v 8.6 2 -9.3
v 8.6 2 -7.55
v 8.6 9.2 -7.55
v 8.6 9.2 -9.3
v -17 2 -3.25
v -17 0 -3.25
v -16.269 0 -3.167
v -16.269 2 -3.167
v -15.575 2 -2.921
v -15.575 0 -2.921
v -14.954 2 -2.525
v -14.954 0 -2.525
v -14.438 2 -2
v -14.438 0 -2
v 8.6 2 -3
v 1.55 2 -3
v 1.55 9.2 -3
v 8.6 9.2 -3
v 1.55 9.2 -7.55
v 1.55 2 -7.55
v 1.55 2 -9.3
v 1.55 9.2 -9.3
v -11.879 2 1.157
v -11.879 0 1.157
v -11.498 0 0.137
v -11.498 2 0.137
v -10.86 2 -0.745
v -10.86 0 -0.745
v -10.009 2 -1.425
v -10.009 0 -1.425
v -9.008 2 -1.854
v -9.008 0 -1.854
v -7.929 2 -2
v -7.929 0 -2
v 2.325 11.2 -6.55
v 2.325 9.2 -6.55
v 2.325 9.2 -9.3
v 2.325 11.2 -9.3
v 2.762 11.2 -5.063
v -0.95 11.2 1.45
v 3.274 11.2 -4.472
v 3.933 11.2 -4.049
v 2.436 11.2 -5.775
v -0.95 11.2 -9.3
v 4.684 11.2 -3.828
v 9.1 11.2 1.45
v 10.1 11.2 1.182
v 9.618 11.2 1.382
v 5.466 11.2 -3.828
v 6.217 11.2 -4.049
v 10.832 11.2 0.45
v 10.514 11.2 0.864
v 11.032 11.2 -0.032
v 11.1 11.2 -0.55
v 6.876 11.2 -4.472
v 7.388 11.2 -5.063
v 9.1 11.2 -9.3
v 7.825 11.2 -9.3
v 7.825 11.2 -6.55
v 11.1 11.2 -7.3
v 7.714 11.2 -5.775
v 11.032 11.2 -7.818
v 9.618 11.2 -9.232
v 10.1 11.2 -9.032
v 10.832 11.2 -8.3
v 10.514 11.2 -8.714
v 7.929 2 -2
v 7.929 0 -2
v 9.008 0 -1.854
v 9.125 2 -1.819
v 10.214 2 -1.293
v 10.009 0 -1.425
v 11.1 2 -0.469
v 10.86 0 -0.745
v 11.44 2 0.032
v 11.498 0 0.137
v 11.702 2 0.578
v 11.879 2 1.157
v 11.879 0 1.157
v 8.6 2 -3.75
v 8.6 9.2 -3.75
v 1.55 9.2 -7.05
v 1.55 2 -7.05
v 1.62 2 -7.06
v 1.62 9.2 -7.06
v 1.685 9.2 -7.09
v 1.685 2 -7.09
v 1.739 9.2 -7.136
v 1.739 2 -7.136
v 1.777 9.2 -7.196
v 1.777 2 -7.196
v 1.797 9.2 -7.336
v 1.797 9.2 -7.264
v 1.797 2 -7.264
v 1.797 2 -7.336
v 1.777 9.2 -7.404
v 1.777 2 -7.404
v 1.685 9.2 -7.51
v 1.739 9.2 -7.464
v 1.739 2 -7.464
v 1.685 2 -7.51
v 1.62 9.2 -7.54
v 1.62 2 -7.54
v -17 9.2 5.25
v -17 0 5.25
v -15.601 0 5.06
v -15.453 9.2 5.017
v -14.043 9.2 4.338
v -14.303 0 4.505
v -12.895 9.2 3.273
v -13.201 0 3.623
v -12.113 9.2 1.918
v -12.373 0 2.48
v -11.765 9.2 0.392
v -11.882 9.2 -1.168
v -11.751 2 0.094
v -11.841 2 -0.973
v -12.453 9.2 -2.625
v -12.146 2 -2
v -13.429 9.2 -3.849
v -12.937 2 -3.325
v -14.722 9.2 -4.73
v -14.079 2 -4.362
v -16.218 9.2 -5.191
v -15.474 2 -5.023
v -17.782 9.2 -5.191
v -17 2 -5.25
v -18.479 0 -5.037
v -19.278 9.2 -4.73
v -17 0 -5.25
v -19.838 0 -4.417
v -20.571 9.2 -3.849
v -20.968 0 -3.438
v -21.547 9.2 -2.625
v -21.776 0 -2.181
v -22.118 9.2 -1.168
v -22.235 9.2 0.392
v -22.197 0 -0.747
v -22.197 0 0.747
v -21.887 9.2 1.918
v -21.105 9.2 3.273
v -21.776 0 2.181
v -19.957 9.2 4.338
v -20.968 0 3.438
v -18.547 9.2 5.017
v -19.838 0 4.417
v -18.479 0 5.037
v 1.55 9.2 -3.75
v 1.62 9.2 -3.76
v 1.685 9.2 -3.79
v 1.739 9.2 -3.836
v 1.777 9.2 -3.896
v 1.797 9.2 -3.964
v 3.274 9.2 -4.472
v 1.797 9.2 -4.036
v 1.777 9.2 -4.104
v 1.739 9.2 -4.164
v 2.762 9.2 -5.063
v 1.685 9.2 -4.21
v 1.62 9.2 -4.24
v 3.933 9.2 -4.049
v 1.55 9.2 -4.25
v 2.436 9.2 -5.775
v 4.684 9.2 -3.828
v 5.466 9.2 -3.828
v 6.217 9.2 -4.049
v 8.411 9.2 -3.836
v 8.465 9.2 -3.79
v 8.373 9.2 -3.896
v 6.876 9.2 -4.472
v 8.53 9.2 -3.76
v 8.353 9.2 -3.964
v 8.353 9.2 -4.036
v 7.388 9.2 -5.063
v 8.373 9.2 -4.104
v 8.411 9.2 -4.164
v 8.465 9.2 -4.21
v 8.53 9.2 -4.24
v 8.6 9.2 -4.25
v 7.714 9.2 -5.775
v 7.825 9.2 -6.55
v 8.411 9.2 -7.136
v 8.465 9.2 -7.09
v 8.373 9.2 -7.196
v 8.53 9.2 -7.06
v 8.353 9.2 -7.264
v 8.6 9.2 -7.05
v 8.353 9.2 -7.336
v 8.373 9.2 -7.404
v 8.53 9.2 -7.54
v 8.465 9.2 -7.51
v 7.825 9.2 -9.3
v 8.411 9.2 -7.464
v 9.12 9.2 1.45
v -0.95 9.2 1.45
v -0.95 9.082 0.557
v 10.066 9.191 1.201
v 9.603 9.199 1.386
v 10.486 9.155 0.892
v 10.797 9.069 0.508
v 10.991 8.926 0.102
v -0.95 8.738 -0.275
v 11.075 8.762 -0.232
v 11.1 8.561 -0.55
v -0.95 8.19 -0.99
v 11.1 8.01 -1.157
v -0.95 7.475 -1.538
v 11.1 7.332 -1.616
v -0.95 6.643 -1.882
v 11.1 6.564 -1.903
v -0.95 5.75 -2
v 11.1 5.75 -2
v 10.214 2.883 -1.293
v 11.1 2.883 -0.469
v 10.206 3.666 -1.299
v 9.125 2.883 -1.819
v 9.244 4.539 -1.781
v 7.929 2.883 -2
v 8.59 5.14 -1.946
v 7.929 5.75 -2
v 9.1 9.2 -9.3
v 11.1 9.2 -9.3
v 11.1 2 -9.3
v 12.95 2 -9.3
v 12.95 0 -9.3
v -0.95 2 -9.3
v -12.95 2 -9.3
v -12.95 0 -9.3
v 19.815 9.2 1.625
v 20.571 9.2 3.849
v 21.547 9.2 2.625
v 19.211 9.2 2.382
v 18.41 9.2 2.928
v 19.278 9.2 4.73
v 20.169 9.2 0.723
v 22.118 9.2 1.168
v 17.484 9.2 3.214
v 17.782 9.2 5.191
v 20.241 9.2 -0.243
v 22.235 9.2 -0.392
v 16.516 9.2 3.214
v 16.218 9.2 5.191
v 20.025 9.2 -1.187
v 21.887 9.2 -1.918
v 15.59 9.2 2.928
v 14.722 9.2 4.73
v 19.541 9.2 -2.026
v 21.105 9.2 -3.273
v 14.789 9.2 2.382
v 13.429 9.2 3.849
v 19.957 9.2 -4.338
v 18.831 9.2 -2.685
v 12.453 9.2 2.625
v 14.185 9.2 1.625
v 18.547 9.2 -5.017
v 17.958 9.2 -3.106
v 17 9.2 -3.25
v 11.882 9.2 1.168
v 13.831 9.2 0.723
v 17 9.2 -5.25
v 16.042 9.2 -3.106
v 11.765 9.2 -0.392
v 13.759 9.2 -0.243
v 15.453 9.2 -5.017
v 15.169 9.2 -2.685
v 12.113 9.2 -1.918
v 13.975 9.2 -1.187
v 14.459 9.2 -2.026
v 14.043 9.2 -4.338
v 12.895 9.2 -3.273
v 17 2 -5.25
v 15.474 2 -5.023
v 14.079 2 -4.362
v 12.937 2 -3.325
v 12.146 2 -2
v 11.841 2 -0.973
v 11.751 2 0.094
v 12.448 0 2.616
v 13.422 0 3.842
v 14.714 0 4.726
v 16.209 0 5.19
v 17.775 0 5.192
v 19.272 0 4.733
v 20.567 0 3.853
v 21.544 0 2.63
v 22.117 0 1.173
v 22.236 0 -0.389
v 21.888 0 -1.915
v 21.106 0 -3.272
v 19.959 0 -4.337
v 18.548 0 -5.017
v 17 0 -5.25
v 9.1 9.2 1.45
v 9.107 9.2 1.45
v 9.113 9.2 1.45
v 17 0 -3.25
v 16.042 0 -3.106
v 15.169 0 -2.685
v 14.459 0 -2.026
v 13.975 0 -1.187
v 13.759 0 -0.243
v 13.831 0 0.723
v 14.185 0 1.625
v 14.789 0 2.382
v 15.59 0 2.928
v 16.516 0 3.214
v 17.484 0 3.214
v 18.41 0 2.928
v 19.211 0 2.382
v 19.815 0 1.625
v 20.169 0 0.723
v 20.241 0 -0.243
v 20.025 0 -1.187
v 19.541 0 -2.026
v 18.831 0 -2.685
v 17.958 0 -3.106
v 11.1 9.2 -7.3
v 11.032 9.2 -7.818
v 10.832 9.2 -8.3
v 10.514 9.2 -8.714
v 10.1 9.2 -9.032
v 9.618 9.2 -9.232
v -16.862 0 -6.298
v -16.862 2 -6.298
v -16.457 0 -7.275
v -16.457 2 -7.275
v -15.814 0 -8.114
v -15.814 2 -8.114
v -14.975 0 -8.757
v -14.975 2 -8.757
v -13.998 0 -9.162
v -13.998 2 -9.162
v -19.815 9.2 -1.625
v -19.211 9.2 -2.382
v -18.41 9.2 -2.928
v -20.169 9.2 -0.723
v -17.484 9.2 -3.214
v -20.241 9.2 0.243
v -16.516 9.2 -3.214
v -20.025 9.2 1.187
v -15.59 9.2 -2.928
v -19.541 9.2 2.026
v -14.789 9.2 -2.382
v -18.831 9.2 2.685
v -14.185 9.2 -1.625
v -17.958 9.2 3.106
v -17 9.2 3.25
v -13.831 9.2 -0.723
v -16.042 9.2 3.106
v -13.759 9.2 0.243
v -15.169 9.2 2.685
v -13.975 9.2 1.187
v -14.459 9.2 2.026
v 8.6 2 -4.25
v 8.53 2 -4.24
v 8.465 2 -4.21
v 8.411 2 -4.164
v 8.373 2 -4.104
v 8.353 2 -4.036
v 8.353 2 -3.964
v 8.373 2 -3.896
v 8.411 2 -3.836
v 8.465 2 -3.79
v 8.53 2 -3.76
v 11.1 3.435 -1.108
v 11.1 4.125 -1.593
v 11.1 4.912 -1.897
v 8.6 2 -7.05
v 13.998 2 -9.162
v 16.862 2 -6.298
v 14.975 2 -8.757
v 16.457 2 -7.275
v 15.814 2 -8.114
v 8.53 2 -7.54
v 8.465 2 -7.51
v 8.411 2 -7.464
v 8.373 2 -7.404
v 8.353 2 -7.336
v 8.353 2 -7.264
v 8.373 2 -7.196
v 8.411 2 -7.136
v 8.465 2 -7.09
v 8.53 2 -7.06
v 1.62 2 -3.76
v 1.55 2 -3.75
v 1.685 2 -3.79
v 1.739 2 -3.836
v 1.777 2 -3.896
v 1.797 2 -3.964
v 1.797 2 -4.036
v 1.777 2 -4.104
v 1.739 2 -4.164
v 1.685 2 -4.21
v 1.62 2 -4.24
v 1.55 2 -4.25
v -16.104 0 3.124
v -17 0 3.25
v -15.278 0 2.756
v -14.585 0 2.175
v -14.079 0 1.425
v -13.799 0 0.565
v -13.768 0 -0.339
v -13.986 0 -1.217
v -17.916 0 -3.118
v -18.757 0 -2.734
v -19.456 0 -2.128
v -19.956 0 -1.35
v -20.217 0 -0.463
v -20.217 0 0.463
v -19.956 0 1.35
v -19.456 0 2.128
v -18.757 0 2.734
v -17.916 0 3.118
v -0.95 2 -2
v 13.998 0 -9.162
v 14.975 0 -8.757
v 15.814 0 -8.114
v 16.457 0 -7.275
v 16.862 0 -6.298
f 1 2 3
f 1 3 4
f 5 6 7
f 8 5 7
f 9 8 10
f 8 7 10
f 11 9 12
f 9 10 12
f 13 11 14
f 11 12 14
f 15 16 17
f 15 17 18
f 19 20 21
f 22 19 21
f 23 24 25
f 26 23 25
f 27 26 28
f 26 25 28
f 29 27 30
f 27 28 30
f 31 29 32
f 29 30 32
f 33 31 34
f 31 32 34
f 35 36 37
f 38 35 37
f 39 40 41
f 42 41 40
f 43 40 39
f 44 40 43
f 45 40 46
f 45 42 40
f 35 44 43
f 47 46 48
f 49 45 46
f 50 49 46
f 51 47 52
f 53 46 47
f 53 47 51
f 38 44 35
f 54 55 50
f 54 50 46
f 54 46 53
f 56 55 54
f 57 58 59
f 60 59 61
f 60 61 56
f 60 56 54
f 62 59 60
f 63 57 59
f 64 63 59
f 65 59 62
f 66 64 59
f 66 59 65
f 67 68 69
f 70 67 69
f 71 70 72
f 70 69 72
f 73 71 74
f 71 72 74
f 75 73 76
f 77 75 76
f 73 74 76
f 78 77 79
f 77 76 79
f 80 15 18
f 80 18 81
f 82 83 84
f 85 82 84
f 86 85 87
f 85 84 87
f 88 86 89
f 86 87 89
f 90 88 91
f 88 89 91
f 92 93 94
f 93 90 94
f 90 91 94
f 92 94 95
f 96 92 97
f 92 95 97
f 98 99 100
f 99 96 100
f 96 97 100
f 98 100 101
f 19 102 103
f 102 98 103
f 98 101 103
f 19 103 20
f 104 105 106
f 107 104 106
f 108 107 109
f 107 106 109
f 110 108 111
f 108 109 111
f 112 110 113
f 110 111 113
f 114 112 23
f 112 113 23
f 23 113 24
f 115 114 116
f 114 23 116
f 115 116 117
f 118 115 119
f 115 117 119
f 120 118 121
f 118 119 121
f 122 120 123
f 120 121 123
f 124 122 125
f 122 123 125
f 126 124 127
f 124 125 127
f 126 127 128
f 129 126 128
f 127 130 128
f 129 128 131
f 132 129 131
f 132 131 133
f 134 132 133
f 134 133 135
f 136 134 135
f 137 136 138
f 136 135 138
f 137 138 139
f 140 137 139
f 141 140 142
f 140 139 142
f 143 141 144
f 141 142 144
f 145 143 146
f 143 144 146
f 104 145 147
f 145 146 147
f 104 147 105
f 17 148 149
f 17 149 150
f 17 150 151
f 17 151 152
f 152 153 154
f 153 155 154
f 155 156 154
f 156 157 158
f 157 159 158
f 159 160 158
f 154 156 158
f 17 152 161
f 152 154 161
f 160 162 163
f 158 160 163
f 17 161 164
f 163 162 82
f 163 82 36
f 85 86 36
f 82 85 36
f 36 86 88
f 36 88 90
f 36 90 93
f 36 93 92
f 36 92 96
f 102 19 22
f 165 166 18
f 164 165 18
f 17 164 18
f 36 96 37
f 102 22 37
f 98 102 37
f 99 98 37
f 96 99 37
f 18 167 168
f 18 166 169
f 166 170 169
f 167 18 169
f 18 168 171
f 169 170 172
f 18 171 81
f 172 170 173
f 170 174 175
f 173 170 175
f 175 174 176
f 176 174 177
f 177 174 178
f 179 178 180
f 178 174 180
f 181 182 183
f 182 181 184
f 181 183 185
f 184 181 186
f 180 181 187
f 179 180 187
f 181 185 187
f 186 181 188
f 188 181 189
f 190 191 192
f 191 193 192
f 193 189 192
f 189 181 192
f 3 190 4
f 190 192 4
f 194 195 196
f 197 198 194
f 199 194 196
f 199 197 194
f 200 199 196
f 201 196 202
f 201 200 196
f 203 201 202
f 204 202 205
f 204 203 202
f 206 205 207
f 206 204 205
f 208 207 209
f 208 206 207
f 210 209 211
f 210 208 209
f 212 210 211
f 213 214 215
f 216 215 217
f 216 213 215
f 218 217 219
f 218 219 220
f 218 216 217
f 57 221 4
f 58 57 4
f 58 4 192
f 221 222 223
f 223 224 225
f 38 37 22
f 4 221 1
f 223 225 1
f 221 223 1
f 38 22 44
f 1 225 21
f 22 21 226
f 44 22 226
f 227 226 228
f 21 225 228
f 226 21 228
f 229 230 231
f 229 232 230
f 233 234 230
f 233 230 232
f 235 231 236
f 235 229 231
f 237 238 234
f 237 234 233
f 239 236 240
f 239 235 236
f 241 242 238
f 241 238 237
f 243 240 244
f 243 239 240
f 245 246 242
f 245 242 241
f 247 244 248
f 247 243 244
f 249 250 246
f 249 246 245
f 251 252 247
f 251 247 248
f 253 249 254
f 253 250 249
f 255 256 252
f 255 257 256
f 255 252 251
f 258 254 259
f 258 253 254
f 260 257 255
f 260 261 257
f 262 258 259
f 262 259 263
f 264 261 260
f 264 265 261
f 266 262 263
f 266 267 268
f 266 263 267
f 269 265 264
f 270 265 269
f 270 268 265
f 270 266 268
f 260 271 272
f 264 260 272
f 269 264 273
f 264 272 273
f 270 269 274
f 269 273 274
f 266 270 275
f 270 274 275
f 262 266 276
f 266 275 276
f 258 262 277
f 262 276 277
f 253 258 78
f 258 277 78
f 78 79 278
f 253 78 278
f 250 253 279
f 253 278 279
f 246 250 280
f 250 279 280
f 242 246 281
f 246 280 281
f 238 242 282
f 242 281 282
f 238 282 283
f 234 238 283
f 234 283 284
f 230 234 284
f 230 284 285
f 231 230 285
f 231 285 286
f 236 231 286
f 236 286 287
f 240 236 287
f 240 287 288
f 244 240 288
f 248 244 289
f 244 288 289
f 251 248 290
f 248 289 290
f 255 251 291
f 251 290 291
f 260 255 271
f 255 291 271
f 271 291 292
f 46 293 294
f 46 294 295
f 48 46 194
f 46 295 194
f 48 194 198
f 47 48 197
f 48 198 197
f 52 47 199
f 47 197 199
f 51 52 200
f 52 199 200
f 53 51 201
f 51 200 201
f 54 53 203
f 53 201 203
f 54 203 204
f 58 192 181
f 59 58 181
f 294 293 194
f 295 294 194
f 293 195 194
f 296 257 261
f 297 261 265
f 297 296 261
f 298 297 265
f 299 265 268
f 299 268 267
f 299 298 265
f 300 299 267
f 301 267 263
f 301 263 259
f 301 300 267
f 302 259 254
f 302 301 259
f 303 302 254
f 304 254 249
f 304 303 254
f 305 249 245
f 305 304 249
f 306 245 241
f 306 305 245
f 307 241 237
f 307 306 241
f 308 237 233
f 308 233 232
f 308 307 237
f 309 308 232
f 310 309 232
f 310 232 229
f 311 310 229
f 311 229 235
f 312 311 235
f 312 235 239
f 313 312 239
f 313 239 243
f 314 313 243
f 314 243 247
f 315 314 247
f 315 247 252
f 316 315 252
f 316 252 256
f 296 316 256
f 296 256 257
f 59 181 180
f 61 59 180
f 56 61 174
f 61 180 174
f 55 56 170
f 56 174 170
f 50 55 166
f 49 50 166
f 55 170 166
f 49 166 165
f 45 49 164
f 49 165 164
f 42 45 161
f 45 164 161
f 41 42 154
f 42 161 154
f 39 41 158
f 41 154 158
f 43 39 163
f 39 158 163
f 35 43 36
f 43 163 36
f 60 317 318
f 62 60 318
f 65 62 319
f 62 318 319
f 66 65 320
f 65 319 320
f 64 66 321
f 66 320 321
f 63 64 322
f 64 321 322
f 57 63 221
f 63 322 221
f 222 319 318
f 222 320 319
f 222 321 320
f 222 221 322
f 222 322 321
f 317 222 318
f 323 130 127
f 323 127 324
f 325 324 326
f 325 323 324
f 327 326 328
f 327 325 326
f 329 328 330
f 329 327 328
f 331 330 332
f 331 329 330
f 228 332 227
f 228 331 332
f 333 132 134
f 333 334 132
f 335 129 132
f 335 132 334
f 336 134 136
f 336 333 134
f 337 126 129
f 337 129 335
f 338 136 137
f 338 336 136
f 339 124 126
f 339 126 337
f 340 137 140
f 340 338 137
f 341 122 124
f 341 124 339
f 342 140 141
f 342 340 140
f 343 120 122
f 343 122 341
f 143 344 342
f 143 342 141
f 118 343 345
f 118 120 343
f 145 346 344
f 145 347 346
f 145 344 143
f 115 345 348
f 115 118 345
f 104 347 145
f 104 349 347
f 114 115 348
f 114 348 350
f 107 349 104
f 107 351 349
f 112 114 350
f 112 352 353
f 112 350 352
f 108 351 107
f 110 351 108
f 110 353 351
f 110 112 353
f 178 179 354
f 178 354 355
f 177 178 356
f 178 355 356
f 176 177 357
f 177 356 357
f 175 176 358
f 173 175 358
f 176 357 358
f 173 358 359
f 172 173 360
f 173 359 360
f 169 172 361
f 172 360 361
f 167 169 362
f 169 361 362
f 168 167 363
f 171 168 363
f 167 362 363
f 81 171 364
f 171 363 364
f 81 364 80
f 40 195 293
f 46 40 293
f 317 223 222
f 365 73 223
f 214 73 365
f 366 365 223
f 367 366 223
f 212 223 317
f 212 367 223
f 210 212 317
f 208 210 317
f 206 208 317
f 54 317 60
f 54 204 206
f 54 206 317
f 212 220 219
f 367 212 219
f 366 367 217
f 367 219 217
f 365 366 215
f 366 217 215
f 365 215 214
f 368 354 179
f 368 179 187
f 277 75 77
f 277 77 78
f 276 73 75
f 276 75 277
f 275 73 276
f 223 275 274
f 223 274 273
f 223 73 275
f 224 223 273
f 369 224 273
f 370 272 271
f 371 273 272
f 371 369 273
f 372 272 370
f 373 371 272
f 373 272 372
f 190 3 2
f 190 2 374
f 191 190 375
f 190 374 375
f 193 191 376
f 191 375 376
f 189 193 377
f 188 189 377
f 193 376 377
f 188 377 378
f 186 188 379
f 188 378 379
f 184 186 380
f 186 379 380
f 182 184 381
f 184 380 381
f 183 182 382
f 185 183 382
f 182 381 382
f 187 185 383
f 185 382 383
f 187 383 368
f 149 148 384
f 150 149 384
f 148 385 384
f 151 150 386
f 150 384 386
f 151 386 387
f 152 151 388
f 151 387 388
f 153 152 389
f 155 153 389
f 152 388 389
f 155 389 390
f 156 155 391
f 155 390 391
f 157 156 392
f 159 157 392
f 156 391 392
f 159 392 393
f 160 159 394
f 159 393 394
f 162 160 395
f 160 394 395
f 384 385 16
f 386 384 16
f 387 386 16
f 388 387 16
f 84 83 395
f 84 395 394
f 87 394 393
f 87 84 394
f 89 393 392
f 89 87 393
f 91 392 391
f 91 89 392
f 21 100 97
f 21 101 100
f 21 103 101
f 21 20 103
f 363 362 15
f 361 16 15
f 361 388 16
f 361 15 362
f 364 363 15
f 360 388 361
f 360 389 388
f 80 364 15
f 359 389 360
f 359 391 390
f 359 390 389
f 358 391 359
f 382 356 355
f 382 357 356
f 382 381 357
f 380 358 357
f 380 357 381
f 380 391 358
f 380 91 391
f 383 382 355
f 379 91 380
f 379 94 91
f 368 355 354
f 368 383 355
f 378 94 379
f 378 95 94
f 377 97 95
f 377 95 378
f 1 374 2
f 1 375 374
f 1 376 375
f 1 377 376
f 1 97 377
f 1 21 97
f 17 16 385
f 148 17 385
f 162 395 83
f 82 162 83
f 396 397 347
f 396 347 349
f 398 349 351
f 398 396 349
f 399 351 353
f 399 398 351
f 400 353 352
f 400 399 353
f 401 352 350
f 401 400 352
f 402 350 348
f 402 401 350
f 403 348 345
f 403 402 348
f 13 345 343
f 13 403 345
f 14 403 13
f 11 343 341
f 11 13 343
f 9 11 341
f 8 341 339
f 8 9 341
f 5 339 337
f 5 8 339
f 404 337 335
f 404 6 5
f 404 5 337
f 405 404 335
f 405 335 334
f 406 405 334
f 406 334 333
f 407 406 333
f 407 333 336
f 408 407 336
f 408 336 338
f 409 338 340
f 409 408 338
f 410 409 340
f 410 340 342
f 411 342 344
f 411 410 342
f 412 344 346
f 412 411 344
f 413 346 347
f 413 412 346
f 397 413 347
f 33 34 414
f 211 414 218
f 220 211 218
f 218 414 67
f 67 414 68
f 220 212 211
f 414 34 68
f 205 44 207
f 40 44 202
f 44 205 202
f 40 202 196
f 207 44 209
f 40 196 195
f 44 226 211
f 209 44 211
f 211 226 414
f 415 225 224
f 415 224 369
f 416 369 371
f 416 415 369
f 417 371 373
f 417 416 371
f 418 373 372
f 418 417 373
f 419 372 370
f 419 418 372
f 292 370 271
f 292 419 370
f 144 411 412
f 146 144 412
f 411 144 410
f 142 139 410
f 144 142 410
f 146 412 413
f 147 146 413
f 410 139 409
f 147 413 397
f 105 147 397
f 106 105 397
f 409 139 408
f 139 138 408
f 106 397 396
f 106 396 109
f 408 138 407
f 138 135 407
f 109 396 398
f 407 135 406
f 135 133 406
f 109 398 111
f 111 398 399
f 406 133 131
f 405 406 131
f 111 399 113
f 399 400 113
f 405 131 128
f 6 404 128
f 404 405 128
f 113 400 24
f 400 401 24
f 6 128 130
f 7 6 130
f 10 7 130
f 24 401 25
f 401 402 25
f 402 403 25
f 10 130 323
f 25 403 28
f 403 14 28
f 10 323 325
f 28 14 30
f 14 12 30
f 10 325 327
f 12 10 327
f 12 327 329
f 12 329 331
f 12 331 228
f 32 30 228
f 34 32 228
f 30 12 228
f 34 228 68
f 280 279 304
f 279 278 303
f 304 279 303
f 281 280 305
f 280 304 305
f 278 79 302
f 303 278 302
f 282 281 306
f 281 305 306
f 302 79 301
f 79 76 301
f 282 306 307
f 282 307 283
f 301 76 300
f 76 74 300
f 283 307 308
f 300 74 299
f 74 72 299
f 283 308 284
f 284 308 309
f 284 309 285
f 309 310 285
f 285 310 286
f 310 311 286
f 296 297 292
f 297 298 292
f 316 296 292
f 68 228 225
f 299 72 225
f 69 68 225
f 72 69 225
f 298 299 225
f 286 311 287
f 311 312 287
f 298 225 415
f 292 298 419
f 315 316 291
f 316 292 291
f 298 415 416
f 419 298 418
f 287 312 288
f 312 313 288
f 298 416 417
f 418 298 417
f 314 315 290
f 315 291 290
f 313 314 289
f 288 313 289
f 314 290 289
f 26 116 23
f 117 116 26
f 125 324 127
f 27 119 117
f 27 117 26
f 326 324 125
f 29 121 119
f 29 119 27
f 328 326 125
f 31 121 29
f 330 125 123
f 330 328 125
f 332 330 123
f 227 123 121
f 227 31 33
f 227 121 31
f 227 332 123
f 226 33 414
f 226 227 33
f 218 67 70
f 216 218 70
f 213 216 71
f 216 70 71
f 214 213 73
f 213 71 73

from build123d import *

# Parameters (mm, degrees)
SKETCH1_R             = 5.25
SKETCH1_R_2           = 3.25
BOSS_EXTRUDE1_DEPTH   = 9.2
BOSS_EXTRUDE1_2_DEPTH = 9.2
BOSS_EXTRUDE2_DEPTH   = 2
SKETCH3_W             = 2.5
SKETCH3_H             = 7.3
BOSS_EXTRUDE3_DEPTH   = 7.2
BOSS_EXTRUDE4_DEPTH   = 2
SKETCH6_R             = 0.25
BOSS_EXTRUDE5_DEPTH   = 7.2
BOSS_EXTRUDE6_REACH   = 27.811
SKETCH7_W             = 7.05
SKETCH7_H             = 1
FILLET3_R             = 3.45
FILLET4_DEPTH         = 2
FILLET4_2_DEPTH       = 2
FILLET4_START         = 2
FILLET4_3_DEPTH       = 0.883001
FILLET4_START_2       = 7.928754
FILLET4_4_DEPTH       = 3.171246
FILLET4_START_3       = 2.883001
FILLET4_5_DEPTH       = 2.866999


with BuildPart() as part:
    # Sketch1 → Boss-Extrude1 (new body)
    with BuildSketch(Plane(origin=(0, 0, 0), x_dir=(1, 0, 0), z_dir=(0, 1, 0))):
        with Locations(Location((-17, 0, 0), (0, 0, 270))):
            Circle(SKETCH1_R)
        with Locations(Location((-17, 0, 0), (0, 0, 270))):
            Circle(SKETCH1_R_2, mode=Mode.SUBTRACT)
    extrude(amount=BOSS_EXTRUDE1_DEPTH)



with BuildPart() as body_2:
    # Sketch1 → Boss-Extrude1 2 (new body)
    with BuildSketch(Plane(origin=(0, 0, 0), x_dir=(1, 0, 0), z_dir=(0, 1, 0))):
        with Locations(Location((17, 0, 0), (0, 0, 90))):
            Circle(SKETCH1_R)
        with Locations(Location((17, 0, 0), (0, 0, 90))):
            Circle(SKETCH1_R_2, mode=Mode.SUBTRACT)
    extrude(amount=BOSS_EXTRUDE1_2_DEPTH)


with BuildPart() as part_1:
    add(part.part)

    add(body_2.part)  # Boss-Extrude2 merges body 2
    # Sketch2 → Boss-Extrude2 (add)
    with BuildSketch(Plane(origin=(0, 0, 0), x_dir=(1, 0, 0), z_dir=(0, 1, 0))):
        with BuildLine():
            Line((17, 9.3), (-17, 9.3))
            Line((-17, 9.3), (-17, 3.25))
            ThreePointArc((-17, 3.25), (-15.574781, 2.92083), (-14.438262, 2))
            Line((-14.438262, 2), (14.438262, 2))
            ThreePointArc((14.438262, 2), (15.574781, 2.92083), (17, 3.25))
            Line((17, 3.25), (17, 9.3))
        make_face()
    extrude(amount=BOSS_EXTRUDE2_DEPTH)

    # Sketch3 → Boss-Extrude3 (add)
    with BuildSketch(Plane(origin=(0, 2, 0), x_dir=(1, 0, 0), z_dir=(0, 1, 0))):
        with Locations((0.3, 5.65)):
            Rectangle(SKETCH3_W, SKETCH3_H)
        with Locations((9.85, 5.65)):
            Rectangle(SKETCH3_W, SKETCH3_H)
    extrude(amount=BOSS_EXTRUDE3_DEPTH)

    # Sketch5 → Boss-Extrude4 (add)
    with BuildSketch(Plane(origin=(0, 9.2, 0), x_dir=(1, 0, 0), z_dir=(0, 1, 0))):
        with BuildLine():
            Line((1.55, 9.3), (-0.95, 9.3))
            Line((-0.95, 9.3), (-0.95, -1.45))
            Line((-0.95, -1.45), (9.1, -1.45))
            ThreePointArc((9.1, -1.45), (10.514214, -0.864214), (11.1, 0.55))
            Line((11.1, 0.55), (11.1, 2))
            Line((11.1, 2), (8.6, 2))
            Line((8.6, 2), (1.55, 2))
            Line((1.55, 2), (1.55, 9.3))
        make_face()
        with BuildLine():
            Line((8.6, 9.3), (8.6, 2))
            Line((8.6, 2), (11.1, 2))
            Line((11.1, 2), (11.1, 7.3))
            ThreePointArc((11.1, 7.3), (10.514214, 8.714214), (9.1, 9.3))
            Line((9.1, 9.3), (8.6, 9.3))
        make_face()
        with BuildLine():
            Line((2.325, 9.3), (1.55, 9.3))
            Line((1.55, 9.3), (1.55, 2))
            Line((1.55, 2), (8.6, 2))
            Line((8.6, 2), (8.6, 9.3))
            Line((8.6, 9.3), (7.825, 9.3))
            Line((7.825, 9.3), (7.825, 6.55))
            ThreePointArc((7.825, 6.55), (5.075, 3.8), (2.325, 6.55))
            Line((2.325, 6.55), (2.325, 9.3))
        make_face()
    extrude(amount=BOSS_EXTRUDE4_DEPTH)

    # Sketch6 → Boss-Extrude5 (add)
    with BuildSketch(Plane(origin=(0, 2, 0), x_dir=(1, 0, 0), z_dir=(0, 1, 0))):
        with Locations((1.55, 7.3)):
            Circle(SKETCH6_R)
        with Locations((1.55, 4)):
            Circle(SKETCH6_R)
        with Locations((8.6, 7.3)):
            Circle(SKETCH6_R)
        with Locations((8.6, 4)):
            Circle(SKETCH6_R)
    extrude(amount=BOSS_EXTRUDE5_DEPTH)

    # Sketch7 → Boss-Extrude6 (add, up to next)
    with BuildSketch(Plane(origin=(0, 2, 0), x_dir=(1, 0, 0), z_dir=(0, 1, 0)), mode=Mode.PRIVATE) as boss_extrude6_sk1:
        with Locations((5.075, 2.5)):
            Rectangle(SKETCH7_W, SKETCH7_H)
    boss_extrude6_tool1 = extrude(boss_extrude6_sk1.sketch, amount=BOSS_EXTRUDE6_REACH, mode=Mode.PRIVATE) - part_1.part
    add(boss_extrude6_tool1.solids().sort_by_distance((5.075, 2, -2.5))[0])

    # Fillet3
    fillet3_edges = [part_1.edges().sort_by_distance(p)[0] for p in [
        (5.075, 9.2, -2),
    ]]
    fillet(fillet3_edges, radius=FILLET3_R - 0.0001)  # a hair under: the kernel refuses the full size

    # Fillet4: read off the stored shape, not the designer's step
    # Fillet4 outline → Fillet4 (cut)
    with BuildSketch(Plane(origin=(0, 0, 0), x_dir=(1, 0, 0), z_dir=(0, 1, 0))):
        with BuildLine():
            ThreePointArc((12.95, 9.3), (15.813782, 8.113782), (17, 5.25))
            Line((17, 5.25), (17, 9.3))
            Line((17, 9.3), (12.95, 9.3))
        make_face()
        with BuildLine():
            ThreePointArc((-17, 5.25), (-15.813782, 8.113782), (-12.95, 9.3))
            Line((-12.95, 9.3), (-17, 9.3))
            Line((-17, 9.3), (-17, 5.25))
        make_face()
    extrude(amount=FILLET4_DEPTH, mode=Mode.SUBTRACT)

    # Fillet4 2 outline → Fillet4 2 (add)
    with BuildSketch(Plane(origin=(0, 0, 0), x_dir=(1, 0, 0), z_dir=(0, 1, 0))):
        with BuildLine():
            ThreePointArc((7.928754, 2), (10.457281, 1.113709), (11.879135, -1.157258))
            ThreePointArc((11.879135, -1.157258), (11.768637, 0.441974), (12.145878, 2))
            Line((12.145878, 2), (7.928754, 2))
        make_face()
        with BuildLine():
            ThreePointArc((-11.879135, -1.157258), (-10.457281, 1.113709), (-7.928754, 2))
            Line((-7.928754, 2), (-12.145878, 2))
            ThreePointArc((-12.145878, 2), (-11.768637, 0.441974), (-11.879135, -1.157258))
        make_face()
    extrude(amount=FILLET4_2_DEPTH)

    # Fillet4 3 outline → Fillet4 3 (add)
    with BuildSketch(Plane(origin=(0, 0, 0), x_dir=(1, 0, 0), z_dir=(0, 1, 0)).offset(FILLET4_START)):
        with BuildLine():
            ThreePointArc((7.928754, 2), (9.689475, 1.59724), (11.1, 0.469067))
            Line((11.1, 0.469067), (11.1, 2))
            Line((11.1, 2), (7.928754, 2))
        make_face()
    extrude(amount=FILLET4_3_DEPTH)

    # Fillet4 4 outline → Fillet4 4 (add)
    with BuildSketch(Plane.YZ.offset(FILLET4_START_2)):
        with BuildLine():
            ThreePointArc((5.75, -2), (4.124928, -1.593294), (2.883001, -0.469067))
            Line((2.883001, -0.469067), (2.883001, -2))
            Line((2.883001, -2), (5.75, -2))
        make_face()
    extrude(amount=FILLET4_4_DEPTH)

    # Fillet4 5 outline → Fillet4 5 (cut)
    with BuildSketch(Plane(origin=(0, 0, 0), x_dir=(1, 0, 0), z_dir=(0, 1, 0)).offset(FILLET4_START_3)):
        with BuildLine():
            ThreePointArc((11.840276, -1), (10.393506, 1.163643), (7.928754, 2))
            Line((7.928754, 2), (7.928754, -1))
            Line((7.928754, -1), (11.840276, -1))
        make_face()
    extrude(amount=FILLET4_5_DEPTH, mode=Mode.SUBTRACT)


solid = part_1.part
